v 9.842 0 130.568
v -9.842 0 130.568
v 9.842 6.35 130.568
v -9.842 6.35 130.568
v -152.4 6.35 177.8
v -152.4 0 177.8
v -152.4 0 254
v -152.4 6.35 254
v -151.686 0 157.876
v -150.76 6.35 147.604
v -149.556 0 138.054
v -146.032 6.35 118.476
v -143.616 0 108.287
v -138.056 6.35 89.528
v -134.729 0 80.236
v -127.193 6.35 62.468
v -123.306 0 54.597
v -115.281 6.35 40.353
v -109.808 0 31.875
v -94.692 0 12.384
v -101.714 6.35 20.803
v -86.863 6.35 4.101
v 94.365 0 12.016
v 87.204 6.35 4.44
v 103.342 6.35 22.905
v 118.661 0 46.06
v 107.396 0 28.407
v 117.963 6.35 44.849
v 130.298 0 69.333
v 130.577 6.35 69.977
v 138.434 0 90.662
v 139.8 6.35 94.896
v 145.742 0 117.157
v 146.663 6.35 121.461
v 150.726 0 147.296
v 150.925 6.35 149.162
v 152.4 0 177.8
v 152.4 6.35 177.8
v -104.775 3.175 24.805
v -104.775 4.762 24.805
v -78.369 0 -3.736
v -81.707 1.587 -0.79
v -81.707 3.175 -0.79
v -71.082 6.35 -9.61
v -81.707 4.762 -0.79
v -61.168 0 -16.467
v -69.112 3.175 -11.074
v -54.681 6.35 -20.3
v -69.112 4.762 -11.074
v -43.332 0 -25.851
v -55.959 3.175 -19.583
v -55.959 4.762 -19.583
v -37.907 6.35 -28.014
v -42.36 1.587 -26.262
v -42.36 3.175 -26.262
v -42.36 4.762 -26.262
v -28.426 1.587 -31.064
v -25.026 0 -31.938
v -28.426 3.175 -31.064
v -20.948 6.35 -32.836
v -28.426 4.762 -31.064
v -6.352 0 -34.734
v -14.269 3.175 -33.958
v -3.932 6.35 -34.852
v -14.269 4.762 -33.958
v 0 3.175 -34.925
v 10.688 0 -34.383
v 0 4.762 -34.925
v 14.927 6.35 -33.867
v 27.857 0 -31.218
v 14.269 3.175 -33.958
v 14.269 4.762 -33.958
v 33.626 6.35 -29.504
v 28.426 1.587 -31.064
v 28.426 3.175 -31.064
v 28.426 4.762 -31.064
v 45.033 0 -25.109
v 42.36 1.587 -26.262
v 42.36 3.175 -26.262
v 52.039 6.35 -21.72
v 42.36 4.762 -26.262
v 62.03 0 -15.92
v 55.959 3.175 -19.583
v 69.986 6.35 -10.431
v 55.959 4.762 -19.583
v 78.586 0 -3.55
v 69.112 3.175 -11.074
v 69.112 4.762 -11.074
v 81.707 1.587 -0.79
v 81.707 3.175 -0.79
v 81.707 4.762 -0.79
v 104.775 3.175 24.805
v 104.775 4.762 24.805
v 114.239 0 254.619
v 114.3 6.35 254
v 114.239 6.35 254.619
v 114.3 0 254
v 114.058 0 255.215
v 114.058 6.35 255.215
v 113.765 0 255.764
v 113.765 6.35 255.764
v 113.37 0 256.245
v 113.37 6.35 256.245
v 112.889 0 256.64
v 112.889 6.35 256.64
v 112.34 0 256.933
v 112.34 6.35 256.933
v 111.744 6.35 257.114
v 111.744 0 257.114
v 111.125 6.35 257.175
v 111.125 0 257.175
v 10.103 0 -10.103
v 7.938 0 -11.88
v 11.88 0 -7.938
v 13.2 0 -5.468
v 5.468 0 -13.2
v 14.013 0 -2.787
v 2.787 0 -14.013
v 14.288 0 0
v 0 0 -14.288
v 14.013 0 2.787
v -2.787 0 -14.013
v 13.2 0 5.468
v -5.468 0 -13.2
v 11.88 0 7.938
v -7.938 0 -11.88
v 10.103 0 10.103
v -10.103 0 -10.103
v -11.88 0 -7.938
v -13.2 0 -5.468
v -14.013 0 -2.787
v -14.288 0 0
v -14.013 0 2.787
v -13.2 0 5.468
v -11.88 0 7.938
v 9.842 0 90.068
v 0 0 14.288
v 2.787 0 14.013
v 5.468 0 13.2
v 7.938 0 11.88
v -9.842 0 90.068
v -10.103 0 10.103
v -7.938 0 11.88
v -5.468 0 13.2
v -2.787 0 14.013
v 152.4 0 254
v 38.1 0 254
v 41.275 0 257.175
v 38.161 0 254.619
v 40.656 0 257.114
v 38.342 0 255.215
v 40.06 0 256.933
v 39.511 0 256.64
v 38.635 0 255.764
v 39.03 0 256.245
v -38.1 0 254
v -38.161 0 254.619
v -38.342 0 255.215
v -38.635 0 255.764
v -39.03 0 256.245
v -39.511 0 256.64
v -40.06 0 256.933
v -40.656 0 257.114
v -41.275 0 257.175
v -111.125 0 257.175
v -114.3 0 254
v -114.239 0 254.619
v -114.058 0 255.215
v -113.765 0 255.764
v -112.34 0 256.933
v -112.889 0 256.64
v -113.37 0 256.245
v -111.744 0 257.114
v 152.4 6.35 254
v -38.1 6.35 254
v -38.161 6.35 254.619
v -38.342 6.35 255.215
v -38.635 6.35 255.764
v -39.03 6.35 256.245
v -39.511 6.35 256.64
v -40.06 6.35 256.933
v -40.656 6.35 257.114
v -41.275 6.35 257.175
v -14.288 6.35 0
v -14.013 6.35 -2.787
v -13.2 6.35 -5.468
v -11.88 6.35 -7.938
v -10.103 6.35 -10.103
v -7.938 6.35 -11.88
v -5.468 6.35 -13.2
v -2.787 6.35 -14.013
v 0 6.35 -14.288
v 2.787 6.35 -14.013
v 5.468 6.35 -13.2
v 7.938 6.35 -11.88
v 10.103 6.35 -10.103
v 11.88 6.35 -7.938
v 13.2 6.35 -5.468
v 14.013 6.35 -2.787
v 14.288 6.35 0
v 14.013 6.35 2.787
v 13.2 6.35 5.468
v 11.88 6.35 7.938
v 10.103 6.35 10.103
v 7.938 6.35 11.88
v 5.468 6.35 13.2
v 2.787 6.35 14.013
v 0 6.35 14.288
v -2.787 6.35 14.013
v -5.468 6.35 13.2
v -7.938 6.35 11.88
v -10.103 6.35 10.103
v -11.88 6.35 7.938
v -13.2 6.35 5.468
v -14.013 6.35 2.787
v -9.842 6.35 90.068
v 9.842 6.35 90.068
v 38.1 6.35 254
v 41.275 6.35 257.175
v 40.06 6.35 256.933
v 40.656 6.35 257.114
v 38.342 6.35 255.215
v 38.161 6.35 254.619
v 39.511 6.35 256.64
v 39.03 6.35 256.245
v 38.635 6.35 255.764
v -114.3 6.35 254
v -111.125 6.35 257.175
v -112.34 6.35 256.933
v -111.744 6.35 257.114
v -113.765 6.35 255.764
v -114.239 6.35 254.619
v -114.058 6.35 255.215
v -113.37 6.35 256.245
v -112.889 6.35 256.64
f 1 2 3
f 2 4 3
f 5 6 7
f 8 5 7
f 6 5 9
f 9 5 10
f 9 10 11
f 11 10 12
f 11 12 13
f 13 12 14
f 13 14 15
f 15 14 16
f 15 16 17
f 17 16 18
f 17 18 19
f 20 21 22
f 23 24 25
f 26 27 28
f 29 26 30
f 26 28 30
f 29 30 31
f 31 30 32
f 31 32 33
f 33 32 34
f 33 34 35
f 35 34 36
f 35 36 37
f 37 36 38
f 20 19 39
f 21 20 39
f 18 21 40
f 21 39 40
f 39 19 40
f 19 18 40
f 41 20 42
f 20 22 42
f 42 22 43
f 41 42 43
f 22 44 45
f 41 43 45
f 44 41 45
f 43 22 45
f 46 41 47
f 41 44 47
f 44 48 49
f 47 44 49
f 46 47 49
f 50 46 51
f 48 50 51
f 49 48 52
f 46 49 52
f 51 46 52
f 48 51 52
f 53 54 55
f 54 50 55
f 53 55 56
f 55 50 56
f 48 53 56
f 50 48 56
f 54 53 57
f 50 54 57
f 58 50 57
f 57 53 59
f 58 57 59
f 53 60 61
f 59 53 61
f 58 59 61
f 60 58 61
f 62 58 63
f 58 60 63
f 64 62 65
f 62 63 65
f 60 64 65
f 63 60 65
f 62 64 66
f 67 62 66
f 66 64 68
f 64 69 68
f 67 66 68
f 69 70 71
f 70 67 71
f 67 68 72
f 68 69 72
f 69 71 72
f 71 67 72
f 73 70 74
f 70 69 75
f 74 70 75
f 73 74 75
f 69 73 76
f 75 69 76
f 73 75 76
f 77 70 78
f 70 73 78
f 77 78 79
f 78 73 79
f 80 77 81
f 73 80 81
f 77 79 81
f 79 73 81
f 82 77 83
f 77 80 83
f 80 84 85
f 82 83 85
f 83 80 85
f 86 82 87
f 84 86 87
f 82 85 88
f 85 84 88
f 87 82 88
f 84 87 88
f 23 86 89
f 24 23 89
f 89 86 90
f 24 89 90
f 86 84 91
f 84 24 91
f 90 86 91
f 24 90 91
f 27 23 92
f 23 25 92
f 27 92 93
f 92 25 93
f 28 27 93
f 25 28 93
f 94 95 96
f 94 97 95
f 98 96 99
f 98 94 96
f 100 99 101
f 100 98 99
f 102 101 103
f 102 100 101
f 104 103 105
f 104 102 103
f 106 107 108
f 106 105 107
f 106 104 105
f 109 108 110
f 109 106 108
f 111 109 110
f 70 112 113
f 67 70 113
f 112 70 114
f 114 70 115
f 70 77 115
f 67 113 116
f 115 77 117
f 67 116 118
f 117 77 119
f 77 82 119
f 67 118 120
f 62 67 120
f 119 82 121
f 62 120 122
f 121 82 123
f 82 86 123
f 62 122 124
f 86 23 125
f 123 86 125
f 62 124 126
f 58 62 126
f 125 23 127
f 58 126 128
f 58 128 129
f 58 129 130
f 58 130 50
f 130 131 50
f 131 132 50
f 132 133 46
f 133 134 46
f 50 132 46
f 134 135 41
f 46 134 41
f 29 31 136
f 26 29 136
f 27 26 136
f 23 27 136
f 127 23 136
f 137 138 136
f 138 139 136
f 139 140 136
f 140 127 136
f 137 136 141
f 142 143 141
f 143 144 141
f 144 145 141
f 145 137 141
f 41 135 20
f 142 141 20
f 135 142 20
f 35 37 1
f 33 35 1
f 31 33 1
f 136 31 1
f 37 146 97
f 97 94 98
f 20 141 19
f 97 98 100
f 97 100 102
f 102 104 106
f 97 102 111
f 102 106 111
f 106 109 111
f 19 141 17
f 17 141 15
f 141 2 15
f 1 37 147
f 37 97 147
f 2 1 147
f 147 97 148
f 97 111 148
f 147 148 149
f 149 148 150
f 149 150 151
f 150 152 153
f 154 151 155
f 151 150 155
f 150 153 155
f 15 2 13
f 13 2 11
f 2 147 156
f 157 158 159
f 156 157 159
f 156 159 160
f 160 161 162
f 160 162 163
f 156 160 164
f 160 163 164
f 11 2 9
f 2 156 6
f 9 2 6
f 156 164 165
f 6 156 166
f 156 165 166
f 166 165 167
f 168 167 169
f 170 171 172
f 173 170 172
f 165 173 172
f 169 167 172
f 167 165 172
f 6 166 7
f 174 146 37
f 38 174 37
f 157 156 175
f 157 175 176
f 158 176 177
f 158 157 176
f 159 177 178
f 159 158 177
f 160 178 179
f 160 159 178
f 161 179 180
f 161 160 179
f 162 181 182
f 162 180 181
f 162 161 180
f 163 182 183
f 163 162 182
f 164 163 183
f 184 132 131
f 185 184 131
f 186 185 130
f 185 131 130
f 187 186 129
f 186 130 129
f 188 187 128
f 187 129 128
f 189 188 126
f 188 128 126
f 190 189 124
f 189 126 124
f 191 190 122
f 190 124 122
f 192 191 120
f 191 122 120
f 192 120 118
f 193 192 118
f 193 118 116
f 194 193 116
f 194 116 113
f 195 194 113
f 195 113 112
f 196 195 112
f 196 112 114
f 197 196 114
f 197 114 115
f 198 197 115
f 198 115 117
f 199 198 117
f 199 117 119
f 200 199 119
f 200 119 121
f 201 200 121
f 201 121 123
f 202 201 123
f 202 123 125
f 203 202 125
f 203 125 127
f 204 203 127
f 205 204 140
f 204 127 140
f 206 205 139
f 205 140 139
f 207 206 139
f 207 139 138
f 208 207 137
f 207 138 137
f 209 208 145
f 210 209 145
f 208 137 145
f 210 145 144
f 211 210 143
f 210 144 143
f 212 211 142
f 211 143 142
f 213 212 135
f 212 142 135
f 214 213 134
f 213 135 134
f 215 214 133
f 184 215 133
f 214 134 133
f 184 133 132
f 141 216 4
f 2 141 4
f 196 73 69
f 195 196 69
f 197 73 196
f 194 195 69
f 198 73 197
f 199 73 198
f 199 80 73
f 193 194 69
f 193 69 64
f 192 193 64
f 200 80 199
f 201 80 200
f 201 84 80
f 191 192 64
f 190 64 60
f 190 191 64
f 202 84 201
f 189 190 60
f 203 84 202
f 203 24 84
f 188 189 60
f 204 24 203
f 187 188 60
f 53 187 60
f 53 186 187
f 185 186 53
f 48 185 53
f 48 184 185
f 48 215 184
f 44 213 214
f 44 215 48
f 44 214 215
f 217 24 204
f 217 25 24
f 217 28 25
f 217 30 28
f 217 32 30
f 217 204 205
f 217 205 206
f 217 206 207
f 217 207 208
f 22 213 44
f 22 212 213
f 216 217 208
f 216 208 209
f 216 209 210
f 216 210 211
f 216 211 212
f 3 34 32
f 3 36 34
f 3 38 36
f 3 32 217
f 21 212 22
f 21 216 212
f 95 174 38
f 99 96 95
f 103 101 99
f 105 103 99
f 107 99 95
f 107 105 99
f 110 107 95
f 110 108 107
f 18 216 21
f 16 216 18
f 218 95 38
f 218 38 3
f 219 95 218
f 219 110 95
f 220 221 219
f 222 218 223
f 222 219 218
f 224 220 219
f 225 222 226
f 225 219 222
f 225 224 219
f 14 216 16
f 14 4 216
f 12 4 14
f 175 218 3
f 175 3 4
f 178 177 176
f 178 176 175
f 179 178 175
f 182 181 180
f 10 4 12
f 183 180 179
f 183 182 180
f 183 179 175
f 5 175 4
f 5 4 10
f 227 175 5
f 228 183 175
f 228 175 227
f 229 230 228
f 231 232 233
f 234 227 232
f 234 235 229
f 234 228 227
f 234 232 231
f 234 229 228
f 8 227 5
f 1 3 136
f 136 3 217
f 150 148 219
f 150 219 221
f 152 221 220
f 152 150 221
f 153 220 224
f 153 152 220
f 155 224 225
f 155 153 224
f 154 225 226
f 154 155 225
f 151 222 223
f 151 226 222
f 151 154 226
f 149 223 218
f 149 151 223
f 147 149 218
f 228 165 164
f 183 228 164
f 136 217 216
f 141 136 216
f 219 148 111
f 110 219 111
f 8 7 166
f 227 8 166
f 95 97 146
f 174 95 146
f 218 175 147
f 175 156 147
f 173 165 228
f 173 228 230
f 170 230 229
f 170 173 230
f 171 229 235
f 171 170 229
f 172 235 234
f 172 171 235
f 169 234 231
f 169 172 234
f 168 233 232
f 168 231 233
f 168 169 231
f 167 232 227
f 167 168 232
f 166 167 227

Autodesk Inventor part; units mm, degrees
ref_plane "YZ Plane" through (0, 0, 0) normal (1, 0, 0) x (0, 1, 0)
ref_plane "XZ Plane" through (0, 0, 0) normal (0, 1, 0) x (-1, 0, 0)
ref_plane "XY Plane" through (0, 0, 0) normal (0, 0, 1) x (1, 0, 0)
sketch "Sketch1" plane through (0, 0, 0) normal (0, 1, 0) x (-1, 0, 0)
  line L0 (0, -234.315) -> (0, 339.09) projected
  line L1 (-213.36, 0) -> (213.36, 0) projected
  line L2 (213.36, 0) -> (-213.36, 0) projected
  line L3 (0, -234.315) -> (0, 339.09) projected
  line L4 (152.4, 254) -> (-152.4, 254)
  line L5 (-152.4, 254) -> (-152.4, 0)
  line L6 (152.4, 0) -> (152.4, 254)
  arc A0 (-152.4, 0) -> (152.4, 0) centre (0, 0) ccw
  line L7 (111.125, 254) -> (41.275, 254) construction
  line L8 (111.125, 257.175) -> (41.275, 257.175)
  line L9 (41.275, 250.825) -> (111.125, 250.825)
  arc A1 (111.125, 250.825) -> (111.125, 257.175) centre (111.125, 254) ccw
  arc A2 (41.275, 257.175) -> (41.275, 250.825) centre (41.275, 254) ccw
  line L10 (-41.275, 254) -> (-111.125, 254) construction
  line L11 (-41.275, 257.175) -> (-111.125, 257.175)
  line L12 (-111.125, 250.825) -> (-41.275, 250.825)
  arc A3 (-41.275, 250.825) -> (-41.275, 257.175) centre (-41.275, 254) ccw
  arc A4 (-111.125, 257.175) -> (-111.125, 250.825) centre (-111.125, 254) ccw
  circle A5 centre (0, 0) radius 14.2875
  point P0 (76.2, 254)
  point P1 (-76.2, 254)
  point P2 (0, -152.4)
  point P3 (114.3, 254)
  point P4 (38.1, 254)
  dimension "d2" = 69.85
  dimension "d3" = 6.35
  dimension "d4" = 69.85
  dimension "d5" = 6.35
  dimension "d7" = 76.2
  dimension "d8" = 304.8
  dimension "d9" = 76.2
  dimension "d10" = 28.575
  dimension "d11" = 406.4
  dimension "d15" = 76.2
extrude "Extrusion1" add sketch "Sketch1" along normal blind 6.35 contours A0 L1 A5 L0 | L0 A5 L1 A0 | L5 L4 A4 L12 A3 L0 A5 L1 | L1 A5 L0 L4 A2 L9 A1 L6 | A4 L11 A3 L4 | L4 A3 L12 A4 | A1 L9 A2 L4 | L4 A2 L8 A1
sketch "Sketch2" plane through (0, 6.35, 0) normal (0, 1, 0) x (1, 0, 0)
  circle A0 centre (0, 0) radius 57.5
  circle A1 centre (0, -100.33) radius 37.5
  line L0 (-9.8425, -130.5684) -> (9.8425, -130.5684)
  line L1 (9.8425, -130.5684) -> (9.8425, -90.0684)
  line L2 (9.8425, -90.0684) -> (-9.8425, -90.0684)
  line L3 (-9.8425, -90.0684) -> (-9.8425, -130.5684)
  line L4 (0, 234.315) -> (0, -339.09) projected
  dimension "d16" = 115
  dimension "d17" = 75
  dimension "d18" = 19.685
  dimension "d19" = 40.5
  dimension "d20" = 10.2616
  dimension "d21" = 9.8425
  dimension "d24" = 100.33
extrude "Extrusion2" cut sketch "Sketch2" against normal blind 25.4 contours L4 L0 L3 L2 | L2 L1 L0 L4
sketch "Sketch3" plane through (0, 6.35, 0) normal (0, 1, 0) x (1, 0, 0)
  line L0 (9.8425, -90.0684) -> (9.8425, -130.5684) projected
  line L1 (9.8425, -130.5684) -> (-9.8425, -130.5684) projected
  line L2 (-9.8425, -130.5684) -> (-9.8425, -90.0684) projected
  line L3 (-9.8425, -90.0684) -> (9.8425, -90.0684) projected
  circle A0 centre (0, 0) radius 14.2875 projected
  line L4 (-38.1, -254) -> (38.1, -254) projected
  arc A1 (38.1, -254) -> (41.275, -257.175) centre (41.275, -254) ccw projected
  line L5 (41.275, -257.175) -> (111.125, -257.175) projected
  arc A2 (111.125, -257.175) -> (114.3, -254) centre (111.125, -254) ccw projected
  line L6 (114.3, -254) -> (152.4, -254) projected
  line L7 (152.4, -254) -> (152.4, 0) projected
  arc A3 (152.4, 0) -> (-152.4, 0) centre (0, 0) ccw projected
  line L8 (-152.4, 0) -> (-152.4, -254) projected
  line L9 (-152.4, -254) -> (-114.3, -254) projected
  arc A4 (-114.3, -254) -> (-111.125, -257.175) centre (-111.125, -254) ccw projected
  line L10 (-111.125, -257.175) -> (-41.275, -257.175) projected
  arc A5 (-41.275, -257.175) -> (-38.1, -254) centre (-41.275, -254) ccw projected
  line L11 (152.4, -177.8) -> (152.4, 0)
  line L12 (14.2875, 0) -> (-14.2875, 0)
  line L13 (-152.4, 0) -> (-152.4, -177.8)
  arc A6 (152.4, 0) -> (-152.4, 0) centre (0, 0) ccw
  line L14 (-152.4, -177.8) -> (-152.4, 0) construction
  line L15 (-152.4, 0) -> (0, 152.4) construction
  line L16 (0, 152.4) -> (152.4, 0) construction
  line L17 (152.4, 0) -> (152.4, -177.8) construction
  spline S0 degree 4 poles (-152.4, -177.8) (-152.4, 0) (0, 152.4) (152.4, 0) (152.4, -177.8) knots 1 1 1 1 1 2 2 2 2 2
  line L18 (152.4, -177.8) -> (152.4, 0)
  line L19 (-152.4, 0) -> (-152.4, -177.8)
extrude "Extrusion3" cut sketch "Sketch3" against normal blind 25.4 contours L8 A3 L7 S0
properties part number "turretSidePlateOne"
